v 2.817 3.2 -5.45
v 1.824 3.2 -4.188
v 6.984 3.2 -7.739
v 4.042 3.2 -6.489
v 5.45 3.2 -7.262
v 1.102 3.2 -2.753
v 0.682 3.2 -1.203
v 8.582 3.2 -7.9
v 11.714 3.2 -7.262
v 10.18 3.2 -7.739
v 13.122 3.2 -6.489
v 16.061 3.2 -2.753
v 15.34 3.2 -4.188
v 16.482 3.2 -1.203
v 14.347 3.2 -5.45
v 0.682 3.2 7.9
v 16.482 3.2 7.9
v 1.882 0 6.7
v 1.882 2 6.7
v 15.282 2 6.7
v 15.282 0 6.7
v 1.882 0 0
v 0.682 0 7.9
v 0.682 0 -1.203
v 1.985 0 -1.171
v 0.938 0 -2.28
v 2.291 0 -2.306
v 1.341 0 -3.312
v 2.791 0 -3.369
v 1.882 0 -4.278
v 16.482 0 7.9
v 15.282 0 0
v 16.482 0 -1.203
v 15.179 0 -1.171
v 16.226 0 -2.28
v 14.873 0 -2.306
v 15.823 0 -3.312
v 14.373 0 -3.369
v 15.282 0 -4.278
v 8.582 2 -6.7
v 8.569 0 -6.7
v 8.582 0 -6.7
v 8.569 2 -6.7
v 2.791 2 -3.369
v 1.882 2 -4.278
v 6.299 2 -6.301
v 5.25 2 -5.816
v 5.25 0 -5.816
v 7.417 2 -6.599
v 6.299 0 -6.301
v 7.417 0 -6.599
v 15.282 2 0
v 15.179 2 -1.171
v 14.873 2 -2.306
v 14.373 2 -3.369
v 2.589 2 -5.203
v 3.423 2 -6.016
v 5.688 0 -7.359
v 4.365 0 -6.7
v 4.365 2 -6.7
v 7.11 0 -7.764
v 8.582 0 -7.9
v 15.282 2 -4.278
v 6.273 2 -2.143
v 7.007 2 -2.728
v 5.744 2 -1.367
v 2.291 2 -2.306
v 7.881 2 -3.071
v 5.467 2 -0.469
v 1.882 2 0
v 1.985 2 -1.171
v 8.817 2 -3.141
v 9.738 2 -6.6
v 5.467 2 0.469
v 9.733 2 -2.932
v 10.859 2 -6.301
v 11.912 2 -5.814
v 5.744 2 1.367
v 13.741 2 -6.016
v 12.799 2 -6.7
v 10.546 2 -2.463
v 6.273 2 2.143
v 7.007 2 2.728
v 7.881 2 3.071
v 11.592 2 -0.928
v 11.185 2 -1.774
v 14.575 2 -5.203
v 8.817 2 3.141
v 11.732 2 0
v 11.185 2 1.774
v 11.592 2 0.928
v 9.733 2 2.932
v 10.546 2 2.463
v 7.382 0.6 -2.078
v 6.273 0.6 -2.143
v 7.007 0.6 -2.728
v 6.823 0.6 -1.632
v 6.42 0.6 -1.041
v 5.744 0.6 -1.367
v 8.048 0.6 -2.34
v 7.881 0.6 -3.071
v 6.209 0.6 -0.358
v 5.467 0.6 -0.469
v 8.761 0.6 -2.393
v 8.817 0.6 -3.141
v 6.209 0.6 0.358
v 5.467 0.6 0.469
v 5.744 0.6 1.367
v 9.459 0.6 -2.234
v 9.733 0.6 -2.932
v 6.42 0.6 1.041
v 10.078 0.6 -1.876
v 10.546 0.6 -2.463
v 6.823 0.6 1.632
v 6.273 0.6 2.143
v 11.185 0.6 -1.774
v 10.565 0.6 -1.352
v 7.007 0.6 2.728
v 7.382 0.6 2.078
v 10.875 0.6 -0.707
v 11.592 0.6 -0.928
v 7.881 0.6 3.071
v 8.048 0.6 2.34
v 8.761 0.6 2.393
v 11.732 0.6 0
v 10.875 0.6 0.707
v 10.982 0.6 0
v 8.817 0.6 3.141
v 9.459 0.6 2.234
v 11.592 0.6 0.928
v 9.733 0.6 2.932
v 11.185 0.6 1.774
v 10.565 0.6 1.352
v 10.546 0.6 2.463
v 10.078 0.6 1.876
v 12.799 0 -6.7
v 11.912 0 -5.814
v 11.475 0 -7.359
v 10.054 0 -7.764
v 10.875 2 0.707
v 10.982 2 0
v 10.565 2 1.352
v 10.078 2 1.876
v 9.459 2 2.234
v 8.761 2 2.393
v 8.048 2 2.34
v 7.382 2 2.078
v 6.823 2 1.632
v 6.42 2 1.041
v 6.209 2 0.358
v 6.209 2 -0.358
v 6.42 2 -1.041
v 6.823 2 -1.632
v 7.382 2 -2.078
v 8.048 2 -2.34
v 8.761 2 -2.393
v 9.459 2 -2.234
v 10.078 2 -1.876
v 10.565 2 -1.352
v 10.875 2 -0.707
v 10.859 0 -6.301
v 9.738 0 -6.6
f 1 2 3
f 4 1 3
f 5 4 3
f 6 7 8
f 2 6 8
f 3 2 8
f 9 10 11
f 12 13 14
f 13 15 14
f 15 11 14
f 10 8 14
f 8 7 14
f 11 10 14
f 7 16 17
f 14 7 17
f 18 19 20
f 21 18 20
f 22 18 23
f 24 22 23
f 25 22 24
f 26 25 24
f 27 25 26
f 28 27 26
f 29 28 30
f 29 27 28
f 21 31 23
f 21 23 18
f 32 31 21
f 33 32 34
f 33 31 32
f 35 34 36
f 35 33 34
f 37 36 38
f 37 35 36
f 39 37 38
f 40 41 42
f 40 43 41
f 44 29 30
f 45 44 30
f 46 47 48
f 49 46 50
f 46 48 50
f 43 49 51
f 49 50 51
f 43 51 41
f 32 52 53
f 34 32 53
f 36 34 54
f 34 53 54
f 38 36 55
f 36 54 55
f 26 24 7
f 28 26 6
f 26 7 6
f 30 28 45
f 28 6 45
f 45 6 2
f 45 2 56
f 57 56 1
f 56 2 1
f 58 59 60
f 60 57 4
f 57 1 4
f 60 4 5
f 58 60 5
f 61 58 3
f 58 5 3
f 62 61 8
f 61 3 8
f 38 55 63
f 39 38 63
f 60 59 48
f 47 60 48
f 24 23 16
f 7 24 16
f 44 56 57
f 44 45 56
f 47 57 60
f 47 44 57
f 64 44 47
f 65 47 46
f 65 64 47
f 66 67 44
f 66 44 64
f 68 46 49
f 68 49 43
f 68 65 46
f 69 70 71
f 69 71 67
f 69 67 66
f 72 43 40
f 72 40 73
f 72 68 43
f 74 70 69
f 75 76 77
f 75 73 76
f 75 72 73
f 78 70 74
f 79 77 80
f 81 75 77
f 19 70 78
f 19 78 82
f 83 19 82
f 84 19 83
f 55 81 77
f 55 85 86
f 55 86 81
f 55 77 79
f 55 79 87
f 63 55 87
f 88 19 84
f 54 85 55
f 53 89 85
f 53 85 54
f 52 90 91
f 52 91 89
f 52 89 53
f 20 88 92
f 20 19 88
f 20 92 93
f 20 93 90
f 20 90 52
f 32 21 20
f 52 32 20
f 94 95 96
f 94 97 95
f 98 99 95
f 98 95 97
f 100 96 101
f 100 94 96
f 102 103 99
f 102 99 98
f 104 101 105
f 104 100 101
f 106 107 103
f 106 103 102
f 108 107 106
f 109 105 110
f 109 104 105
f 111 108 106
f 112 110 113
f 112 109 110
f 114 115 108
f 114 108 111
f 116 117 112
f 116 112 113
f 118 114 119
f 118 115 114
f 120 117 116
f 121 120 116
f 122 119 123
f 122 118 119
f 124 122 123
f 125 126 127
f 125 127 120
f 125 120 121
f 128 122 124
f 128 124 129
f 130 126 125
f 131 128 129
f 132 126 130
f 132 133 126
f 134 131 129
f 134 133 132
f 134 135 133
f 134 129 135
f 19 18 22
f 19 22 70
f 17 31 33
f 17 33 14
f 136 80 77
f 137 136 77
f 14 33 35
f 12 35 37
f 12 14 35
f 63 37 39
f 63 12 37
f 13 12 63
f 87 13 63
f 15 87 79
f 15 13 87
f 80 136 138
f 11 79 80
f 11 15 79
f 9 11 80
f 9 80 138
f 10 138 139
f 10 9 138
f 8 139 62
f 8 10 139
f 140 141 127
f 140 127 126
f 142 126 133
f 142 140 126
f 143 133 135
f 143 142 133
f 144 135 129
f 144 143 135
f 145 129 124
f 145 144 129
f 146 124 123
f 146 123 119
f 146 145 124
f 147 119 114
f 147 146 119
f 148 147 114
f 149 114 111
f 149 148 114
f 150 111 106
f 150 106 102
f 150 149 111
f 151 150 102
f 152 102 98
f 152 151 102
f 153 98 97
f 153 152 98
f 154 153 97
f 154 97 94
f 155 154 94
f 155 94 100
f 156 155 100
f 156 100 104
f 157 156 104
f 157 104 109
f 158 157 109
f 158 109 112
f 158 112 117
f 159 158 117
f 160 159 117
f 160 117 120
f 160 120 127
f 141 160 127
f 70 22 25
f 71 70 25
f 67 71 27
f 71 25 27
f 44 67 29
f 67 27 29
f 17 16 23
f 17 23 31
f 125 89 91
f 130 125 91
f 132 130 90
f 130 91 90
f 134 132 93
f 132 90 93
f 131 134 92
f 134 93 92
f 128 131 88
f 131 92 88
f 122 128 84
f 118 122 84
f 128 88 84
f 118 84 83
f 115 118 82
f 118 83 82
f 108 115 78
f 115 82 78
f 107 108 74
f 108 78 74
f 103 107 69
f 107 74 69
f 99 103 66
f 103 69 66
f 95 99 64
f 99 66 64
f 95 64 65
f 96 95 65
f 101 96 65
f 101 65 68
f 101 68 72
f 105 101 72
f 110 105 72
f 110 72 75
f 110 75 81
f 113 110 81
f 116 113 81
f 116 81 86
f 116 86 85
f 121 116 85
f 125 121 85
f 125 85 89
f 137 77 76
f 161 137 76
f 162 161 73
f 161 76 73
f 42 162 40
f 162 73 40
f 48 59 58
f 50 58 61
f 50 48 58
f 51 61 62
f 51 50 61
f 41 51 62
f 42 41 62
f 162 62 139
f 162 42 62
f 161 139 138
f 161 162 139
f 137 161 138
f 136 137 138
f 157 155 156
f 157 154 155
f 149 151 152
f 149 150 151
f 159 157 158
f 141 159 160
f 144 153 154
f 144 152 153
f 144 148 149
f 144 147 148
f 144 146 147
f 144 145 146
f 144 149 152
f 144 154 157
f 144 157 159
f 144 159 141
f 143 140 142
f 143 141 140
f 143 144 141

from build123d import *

# Parameters (mm, degrees)
MAINBASESKETCH_W          = 15.8
MAINBASESKETCH_H          = 3.2
MAINBASEEXTRUDE_DEPTH     = 7.9
MAINBASESHELL_T           = -1.2
UNDERSIDECIRCLEEXT_START  = -0.2
UNDERSIDECIRCLESKETCH_R   = 3.15
UNDERSIDECIRCLESKETCH_R_2 = 2.4
UNDERSIDECIRCLEEXT_DEPTH  = 1.6
CUT_EXTRUDE21_DEPTH       = 19.555463972
SWEEP13_DEPTH             = 3


with BuildPart() as part:
    # MainBaseSketch → MainBaseExtrude (new, symmetric)
    with BuildSketch(Plane.XY):
        with Locations((8.581967213, 1.6)):
            Rectangle(MAINBASESKETCH_W, MAINBASESKETCH_H)
    extrude(amount=MAINBASEEXTRUDE_DEPTH, both=True)

    # MainBaseShell
    mainbaseshell_openings = [part.faces().sort_by_distance(p)[0] for p in [
        (8.581967213, 0, 0),
    ]]
    offset(amount=MAINBASESHELL_T, openings=mainbaseshell_openings, kind=Kind.INTERSECTION)

    # UnderSideCircleSketch → UnderSideCircleExt (add)
    with BuildSketch(Plane.XZ.offset(-2).offset(UNDERSIDECIRCLEEXT_START)):
        with Locations((8.581967213, 0)):
            Circle(UNDERSIDECIRCLESKETCH_R)
        with Locations((8.581967213, 0)):
            Circle(UNDERSIDECIRCLESKETCH_R_2, mode=Mode.SUBTRACT)
    extrude(amount=UNDERSIDECIRCLEEXT_DEPTH)

    # Sketch70 → Cut-Extrude21 (cut, through all)
    with BuildSketch(Plane(origin=(0, 3.2, 0), x_dir=(1, 0, 0), z_dir=(0, 1, 0))):
        with BuildLine():
            Line((8.581967213, 7.9), (16.481967213, 7.9))
            Line((16.481967213, 7.9), (16.481967213, 1.203021508))
            ThreePointArc((16.481967213, 1.203021508), (13.76027584, 6.000468394), (8.581967213, 7.9))
        make_face()
    cut_extrude21 = extrude(amount=-CUT_EXTRUDE21_DEPTH, mode=Mode.SUBTRACT)

    # Mirror7: Cut-Extrude21 across plane
    add(cut_extrude21.mirror(Plane.ZY.offset(-8.581967213)), mode=Mode.SUBTRACT)

    # Sweep8: sweep along a curve in space
    with BuildLine() as sweep8_path:
        Line((15.281967213, 0, -4.27816573), (15.281967213, 2, -4.27816573))
    # Sketch75 → Sweep8 (sweep)
    with BuildSketch(Plane(origin=(0, 0, 0), x_dir=(-1, 0, 0), z_dir=(0, -1, 0))):
        with BuildLine():
            Line((-15.281967213, 4.27816573), (-15.281967213, 0))
            ThreePointArc((-15.281967213, 0), (-15.050769738, 1.744876469), (-14.373133216, 3.369331733))
            Line((-14.373133216, 3.369331733), (-15.281967213, 4.27816573))
        make_face()
        with BuildLine():
            Line((-12.798521236, 6.7), (-11.912237665, 5.813716429))
            ThreePointArc((-11.912237665, 5.813716429), (-10.305060351, 6.474638989), (-8.581967213, 6.7))
            Line((-8.581967213, 6.7), (-12.798521236, 6.7))
        make_face()
    sweep(path=sweep8_path.line)

    # Sweep13: read off the stored shape, not the designer's step
    # Sweep13 outline → Sweep13 (add)
    with BuildSketch(Plane(origin=(0, 0, 0), x_dir=(1, 0, 0), z_dir=(0, 1, 0))):
        with BuildLine():
            ThreePointArc((8.581967213, 6.7), (10.305060351, 6.474638989), (11.912237665, 5.813716429))
            Line((11.912237665, 5.813716429), (12.798521236, 6.7))
            ThreePointArc((12.798521236, 6.7), (8.581967213, 7.9), (4.36541319, 6.7))
            Line((4.36541319, 6.7), (5.249626829, 5.815786361))
            ThreePointArc((5.249626829, 5.815786361), (6.857925652, 6.4759933), (8.581967213, 6.7))
        make_face()
        with BuildLine():
            ThreePointArc((1.881967213, 4.27816573), (1.121797778, 2.803095833), (0.681967213, 1.203021508))
            Line((0.681967213, 1.203021508), (0.681967213, -7.9))
            Line((0.681967213, -7.9), (16.481967213, -7.9))
            Line((16.481967213, -7.9), (16.481967213, 1.203021508))
            ThreePointArc((16.481967213, 1.203021508), (16.042136648, 2.803095833), (15.281967213, 4.27816573))
            Line((15.281967213, 4.27816573), (14.373133216, 3.369331733))
            ThreePointArc((14.373133216, 3.369331733), (15.050769738, 1.744876469), (15.281967213, 0))
            Line((15.281967213, 0), (15.281967213, -6.7))
            Line((15.281967213, -6.7), (1.881967213, -6.7))
            Line((1.881967213, -6.7), (1.881967213, 0))
            ThreePointArc((1.881967213, 0), (2.113164688, 1.744876469), (2.79080121, 3.369331733))
            Line((2.79080121, 3.369331733), (1.881967213, 4.27816573))
        make_face()
    extrude(amount=SWEEP13_DEPTH)


solid = part.part
